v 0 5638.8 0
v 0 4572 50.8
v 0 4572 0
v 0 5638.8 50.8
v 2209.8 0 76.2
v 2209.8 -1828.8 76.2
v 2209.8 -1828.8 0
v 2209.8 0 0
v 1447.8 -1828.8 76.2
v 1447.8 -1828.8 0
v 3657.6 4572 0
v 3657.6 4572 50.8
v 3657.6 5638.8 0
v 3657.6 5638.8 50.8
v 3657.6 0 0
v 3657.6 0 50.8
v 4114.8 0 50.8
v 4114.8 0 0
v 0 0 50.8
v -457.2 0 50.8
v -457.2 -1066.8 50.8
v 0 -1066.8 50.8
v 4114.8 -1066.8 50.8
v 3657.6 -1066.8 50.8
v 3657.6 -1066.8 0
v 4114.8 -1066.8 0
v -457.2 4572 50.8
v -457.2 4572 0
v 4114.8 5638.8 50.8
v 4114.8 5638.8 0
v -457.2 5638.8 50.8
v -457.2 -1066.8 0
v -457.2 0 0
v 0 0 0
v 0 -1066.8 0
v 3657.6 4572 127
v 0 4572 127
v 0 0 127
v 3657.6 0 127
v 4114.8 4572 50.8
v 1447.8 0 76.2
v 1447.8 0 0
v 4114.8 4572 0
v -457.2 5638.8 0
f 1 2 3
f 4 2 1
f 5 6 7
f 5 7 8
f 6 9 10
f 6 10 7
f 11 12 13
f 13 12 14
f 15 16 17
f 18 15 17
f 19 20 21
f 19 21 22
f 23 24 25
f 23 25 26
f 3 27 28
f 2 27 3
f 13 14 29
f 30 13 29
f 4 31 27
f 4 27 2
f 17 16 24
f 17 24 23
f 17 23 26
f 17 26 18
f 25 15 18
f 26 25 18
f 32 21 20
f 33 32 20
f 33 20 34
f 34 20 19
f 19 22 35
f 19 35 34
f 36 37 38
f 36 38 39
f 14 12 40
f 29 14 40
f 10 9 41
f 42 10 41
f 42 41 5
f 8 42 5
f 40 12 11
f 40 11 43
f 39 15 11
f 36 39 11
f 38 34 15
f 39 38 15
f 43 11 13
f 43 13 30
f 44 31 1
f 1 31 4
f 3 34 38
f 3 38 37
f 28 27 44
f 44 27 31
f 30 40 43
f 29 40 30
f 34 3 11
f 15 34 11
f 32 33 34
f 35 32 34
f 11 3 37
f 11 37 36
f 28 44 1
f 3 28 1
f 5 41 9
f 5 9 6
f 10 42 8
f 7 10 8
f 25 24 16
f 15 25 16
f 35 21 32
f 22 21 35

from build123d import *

# Parameters (mm, degrees)
F0_W     = 3657.6
F0_H     = 4572
F1_DEPTH = 127
F3_START = -50.8
F2_W     = 762
F2_H     = 1828.8
F3_DEPTH = 76.2
F5_START = -76.2
F4_W     = 457.2
F4_H     = 1066.8
F5_DEPTH = 50.8
F7_START = -76.2
F6_W     = 457.2
F6_H     = 1066.8
F7_DEPTH = 50.8


with BuildPart() as f1:
    # F0 (on Top) → F1 (new body)
    with BuildSketch(Plane.XY):
        with Locations((1828.8, 2286)):
            Rectangle(F0_W, F0_H)
    extrude(amount=F1_DEPTH)


with BuildPart() as f3:
    # F2 (on face) → F3 (new body)
    with BuildSketch(Plane.XY.offset(127).offset(F3_START)):
        with Locations((1828.8, -914.4)):
            Rectangle(F2_W, F2_H)
    extrude(amount=-F3_DEPTH)


with BuildPart() as f5:
    # F4 (on face) → F5 (new body)
    with BuildSketch(Plane.XY.offset(127).offset(F5_START)):
        with Locations((-228.6, -533.4)):
            Rectangle(F4_W, F4_H)
    extrude(amount=-F5_DEPTH)


with BuildPart() as f5b:
    # F4 (on face) → F5, piece 2 (new body)
    with BuildSketch(Plane.XY.offset(127).offset(F5_START)):
        with Locations((3886.2, -533.4)):
            Rectangle(F4_W, F4_H)
    extrude(amount=-F5_DEPTH)


with BuildPart() as f7:
    # F6 (on face) → F7 (new body)
    with BuildSketch(Plane.XY.offset(127).offset(F7_START)):
        with Locations((3886.2, 5105.4)):
            Rectangle(F6_W, F6_H)
    extrude(amount=-F7_DEPTH)


with BuildPart() as f7b:
    # F6 (on face) → F7, piece 2 (new body)
    with BuildSketch(Plane.XY.offset(127).offset(F7_START)):
        with Locations((-228.6, 5105.4)):
            Rectangle(F6_W, F6_H)
    extrude(amount=-F7_DEPTH)


solid = Compound([f1.part, f3.part, f5.part, f5b.part, f7.part, f7b.part])
